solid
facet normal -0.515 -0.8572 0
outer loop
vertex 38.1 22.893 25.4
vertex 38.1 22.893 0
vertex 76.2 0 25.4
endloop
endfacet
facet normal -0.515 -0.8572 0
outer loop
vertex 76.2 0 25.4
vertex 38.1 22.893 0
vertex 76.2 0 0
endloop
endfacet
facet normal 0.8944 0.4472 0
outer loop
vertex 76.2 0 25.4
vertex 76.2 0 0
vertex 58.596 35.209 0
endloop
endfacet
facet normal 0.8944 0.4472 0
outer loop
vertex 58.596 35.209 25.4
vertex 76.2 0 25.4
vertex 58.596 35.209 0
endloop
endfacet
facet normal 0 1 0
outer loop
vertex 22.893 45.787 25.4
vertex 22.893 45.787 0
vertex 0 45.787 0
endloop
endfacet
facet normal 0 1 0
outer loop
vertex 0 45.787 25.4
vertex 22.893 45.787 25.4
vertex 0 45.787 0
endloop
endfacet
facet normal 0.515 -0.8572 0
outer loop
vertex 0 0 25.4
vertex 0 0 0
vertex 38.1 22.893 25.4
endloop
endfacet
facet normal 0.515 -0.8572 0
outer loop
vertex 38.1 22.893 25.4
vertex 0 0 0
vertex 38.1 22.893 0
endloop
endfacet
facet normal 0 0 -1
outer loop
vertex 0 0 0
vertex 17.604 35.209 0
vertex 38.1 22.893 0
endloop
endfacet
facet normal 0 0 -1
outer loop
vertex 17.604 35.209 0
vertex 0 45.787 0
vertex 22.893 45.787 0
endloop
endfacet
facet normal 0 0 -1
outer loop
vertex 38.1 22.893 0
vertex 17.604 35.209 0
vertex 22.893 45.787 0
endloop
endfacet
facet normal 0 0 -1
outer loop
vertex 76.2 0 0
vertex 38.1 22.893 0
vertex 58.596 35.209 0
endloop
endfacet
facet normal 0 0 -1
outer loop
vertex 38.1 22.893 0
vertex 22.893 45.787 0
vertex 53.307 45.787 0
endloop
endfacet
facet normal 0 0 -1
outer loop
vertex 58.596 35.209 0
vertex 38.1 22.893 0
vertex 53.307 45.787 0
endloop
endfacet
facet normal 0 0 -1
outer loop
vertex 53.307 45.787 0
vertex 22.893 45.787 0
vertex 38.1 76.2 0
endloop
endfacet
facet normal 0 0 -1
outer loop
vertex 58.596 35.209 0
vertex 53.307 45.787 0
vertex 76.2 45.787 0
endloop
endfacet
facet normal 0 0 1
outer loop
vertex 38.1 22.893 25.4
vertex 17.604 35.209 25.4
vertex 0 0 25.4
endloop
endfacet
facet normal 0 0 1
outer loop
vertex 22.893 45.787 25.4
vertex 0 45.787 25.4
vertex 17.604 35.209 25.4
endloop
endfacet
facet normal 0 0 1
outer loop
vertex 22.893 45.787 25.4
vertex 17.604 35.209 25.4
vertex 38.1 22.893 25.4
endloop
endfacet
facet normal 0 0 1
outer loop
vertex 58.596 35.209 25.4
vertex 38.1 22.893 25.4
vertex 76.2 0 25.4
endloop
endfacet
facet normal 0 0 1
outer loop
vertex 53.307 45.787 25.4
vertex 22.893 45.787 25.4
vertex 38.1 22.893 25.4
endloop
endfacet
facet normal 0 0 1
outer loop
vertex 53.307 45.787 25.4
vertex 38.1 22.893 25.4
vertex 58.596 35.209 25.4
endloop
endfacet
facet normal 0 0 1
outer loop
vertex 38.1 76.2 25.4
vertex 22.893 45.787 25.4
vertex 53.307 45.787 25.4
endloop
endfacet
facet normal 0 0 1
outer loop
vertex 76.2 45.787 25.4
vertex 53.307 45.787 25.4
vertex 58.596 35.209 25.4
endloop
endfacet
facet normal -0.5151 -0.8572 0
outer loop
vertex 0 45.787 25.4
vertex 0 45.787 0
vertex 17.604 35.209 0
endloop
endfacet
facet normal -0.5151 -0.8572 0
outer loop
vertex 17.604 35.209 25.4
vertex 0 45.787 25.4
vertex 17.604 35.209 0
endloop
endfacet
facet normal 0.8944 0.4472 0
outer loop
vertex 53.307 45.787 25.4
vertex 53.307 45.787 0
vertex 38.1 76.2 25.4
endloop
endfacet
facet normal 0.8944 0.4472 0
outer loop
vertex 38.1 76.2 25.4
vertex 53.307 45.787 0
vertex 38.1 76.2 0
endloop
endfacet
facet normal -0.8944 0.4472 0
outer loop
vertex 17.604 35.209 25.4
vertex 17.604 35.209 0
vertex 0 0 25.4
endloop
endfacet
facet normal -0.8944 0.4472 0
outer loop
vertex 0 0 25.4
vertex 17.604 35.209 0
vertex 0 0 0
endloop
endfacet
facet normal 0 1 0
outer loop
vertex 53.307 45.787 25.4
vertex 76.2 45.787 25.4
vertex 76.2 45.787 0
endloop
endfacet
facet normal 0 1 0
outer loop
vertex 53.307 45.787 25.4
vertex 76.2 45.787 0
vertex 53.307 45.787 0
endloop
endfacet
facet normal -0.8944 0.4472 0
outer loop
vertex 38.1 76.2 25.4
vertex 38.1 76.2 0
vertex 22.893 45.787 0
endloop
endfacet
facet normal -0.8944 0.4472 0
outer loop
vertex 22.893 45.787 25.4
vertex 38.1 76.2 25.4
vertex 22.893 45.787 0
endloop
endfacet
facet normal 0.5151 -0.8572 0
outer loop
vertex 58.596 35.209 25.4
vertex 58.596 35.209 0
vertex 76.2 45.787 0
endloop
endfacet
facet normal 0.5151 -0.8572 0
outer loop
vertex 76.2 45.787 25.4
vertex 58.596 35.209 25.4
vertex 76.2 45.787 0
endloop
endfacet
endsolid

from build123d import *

# Parameters (mm, degrees)
F1_DEPTH = 25.4


with BuildPart() as f1:
    # F0 (on Top) → F1 (new body)
    with BuildSketch(Plane.XY):
        Polygon((38.1, 76.2), (22.8934809566, 45.7869619131), (53.3065190434, 45.7869619131), align=None)
        Polygon((22.8934809566, 45.7869619131), (0, 45.7869619131), (17.6044199078, 35.2088398157), align=None)
        Polygon((17.6044199078, 35.2088398157), (0, 0), (38.1, 22.8934809566), align=None)
        Polygon((38.1, 22.8934809566), (76.2, 0), (58.5955800922, 35.2088398157), align=None)
        Polygon((58.5955800922, 35.2088398157), (76.2, 45.7869619131), (53.3065190434, 45.7869619131), align=None)
        Polygon((17.6044199078, 35.2088398157), (38.1, 22.8934809566), (58.5955800922, 35.2088398157), (53.3065190434, 45.7869619131), (22.8934809566, 45.7869619131), align=None)
    extrude(amount=F1_DEPTH)


solid = f1.part
